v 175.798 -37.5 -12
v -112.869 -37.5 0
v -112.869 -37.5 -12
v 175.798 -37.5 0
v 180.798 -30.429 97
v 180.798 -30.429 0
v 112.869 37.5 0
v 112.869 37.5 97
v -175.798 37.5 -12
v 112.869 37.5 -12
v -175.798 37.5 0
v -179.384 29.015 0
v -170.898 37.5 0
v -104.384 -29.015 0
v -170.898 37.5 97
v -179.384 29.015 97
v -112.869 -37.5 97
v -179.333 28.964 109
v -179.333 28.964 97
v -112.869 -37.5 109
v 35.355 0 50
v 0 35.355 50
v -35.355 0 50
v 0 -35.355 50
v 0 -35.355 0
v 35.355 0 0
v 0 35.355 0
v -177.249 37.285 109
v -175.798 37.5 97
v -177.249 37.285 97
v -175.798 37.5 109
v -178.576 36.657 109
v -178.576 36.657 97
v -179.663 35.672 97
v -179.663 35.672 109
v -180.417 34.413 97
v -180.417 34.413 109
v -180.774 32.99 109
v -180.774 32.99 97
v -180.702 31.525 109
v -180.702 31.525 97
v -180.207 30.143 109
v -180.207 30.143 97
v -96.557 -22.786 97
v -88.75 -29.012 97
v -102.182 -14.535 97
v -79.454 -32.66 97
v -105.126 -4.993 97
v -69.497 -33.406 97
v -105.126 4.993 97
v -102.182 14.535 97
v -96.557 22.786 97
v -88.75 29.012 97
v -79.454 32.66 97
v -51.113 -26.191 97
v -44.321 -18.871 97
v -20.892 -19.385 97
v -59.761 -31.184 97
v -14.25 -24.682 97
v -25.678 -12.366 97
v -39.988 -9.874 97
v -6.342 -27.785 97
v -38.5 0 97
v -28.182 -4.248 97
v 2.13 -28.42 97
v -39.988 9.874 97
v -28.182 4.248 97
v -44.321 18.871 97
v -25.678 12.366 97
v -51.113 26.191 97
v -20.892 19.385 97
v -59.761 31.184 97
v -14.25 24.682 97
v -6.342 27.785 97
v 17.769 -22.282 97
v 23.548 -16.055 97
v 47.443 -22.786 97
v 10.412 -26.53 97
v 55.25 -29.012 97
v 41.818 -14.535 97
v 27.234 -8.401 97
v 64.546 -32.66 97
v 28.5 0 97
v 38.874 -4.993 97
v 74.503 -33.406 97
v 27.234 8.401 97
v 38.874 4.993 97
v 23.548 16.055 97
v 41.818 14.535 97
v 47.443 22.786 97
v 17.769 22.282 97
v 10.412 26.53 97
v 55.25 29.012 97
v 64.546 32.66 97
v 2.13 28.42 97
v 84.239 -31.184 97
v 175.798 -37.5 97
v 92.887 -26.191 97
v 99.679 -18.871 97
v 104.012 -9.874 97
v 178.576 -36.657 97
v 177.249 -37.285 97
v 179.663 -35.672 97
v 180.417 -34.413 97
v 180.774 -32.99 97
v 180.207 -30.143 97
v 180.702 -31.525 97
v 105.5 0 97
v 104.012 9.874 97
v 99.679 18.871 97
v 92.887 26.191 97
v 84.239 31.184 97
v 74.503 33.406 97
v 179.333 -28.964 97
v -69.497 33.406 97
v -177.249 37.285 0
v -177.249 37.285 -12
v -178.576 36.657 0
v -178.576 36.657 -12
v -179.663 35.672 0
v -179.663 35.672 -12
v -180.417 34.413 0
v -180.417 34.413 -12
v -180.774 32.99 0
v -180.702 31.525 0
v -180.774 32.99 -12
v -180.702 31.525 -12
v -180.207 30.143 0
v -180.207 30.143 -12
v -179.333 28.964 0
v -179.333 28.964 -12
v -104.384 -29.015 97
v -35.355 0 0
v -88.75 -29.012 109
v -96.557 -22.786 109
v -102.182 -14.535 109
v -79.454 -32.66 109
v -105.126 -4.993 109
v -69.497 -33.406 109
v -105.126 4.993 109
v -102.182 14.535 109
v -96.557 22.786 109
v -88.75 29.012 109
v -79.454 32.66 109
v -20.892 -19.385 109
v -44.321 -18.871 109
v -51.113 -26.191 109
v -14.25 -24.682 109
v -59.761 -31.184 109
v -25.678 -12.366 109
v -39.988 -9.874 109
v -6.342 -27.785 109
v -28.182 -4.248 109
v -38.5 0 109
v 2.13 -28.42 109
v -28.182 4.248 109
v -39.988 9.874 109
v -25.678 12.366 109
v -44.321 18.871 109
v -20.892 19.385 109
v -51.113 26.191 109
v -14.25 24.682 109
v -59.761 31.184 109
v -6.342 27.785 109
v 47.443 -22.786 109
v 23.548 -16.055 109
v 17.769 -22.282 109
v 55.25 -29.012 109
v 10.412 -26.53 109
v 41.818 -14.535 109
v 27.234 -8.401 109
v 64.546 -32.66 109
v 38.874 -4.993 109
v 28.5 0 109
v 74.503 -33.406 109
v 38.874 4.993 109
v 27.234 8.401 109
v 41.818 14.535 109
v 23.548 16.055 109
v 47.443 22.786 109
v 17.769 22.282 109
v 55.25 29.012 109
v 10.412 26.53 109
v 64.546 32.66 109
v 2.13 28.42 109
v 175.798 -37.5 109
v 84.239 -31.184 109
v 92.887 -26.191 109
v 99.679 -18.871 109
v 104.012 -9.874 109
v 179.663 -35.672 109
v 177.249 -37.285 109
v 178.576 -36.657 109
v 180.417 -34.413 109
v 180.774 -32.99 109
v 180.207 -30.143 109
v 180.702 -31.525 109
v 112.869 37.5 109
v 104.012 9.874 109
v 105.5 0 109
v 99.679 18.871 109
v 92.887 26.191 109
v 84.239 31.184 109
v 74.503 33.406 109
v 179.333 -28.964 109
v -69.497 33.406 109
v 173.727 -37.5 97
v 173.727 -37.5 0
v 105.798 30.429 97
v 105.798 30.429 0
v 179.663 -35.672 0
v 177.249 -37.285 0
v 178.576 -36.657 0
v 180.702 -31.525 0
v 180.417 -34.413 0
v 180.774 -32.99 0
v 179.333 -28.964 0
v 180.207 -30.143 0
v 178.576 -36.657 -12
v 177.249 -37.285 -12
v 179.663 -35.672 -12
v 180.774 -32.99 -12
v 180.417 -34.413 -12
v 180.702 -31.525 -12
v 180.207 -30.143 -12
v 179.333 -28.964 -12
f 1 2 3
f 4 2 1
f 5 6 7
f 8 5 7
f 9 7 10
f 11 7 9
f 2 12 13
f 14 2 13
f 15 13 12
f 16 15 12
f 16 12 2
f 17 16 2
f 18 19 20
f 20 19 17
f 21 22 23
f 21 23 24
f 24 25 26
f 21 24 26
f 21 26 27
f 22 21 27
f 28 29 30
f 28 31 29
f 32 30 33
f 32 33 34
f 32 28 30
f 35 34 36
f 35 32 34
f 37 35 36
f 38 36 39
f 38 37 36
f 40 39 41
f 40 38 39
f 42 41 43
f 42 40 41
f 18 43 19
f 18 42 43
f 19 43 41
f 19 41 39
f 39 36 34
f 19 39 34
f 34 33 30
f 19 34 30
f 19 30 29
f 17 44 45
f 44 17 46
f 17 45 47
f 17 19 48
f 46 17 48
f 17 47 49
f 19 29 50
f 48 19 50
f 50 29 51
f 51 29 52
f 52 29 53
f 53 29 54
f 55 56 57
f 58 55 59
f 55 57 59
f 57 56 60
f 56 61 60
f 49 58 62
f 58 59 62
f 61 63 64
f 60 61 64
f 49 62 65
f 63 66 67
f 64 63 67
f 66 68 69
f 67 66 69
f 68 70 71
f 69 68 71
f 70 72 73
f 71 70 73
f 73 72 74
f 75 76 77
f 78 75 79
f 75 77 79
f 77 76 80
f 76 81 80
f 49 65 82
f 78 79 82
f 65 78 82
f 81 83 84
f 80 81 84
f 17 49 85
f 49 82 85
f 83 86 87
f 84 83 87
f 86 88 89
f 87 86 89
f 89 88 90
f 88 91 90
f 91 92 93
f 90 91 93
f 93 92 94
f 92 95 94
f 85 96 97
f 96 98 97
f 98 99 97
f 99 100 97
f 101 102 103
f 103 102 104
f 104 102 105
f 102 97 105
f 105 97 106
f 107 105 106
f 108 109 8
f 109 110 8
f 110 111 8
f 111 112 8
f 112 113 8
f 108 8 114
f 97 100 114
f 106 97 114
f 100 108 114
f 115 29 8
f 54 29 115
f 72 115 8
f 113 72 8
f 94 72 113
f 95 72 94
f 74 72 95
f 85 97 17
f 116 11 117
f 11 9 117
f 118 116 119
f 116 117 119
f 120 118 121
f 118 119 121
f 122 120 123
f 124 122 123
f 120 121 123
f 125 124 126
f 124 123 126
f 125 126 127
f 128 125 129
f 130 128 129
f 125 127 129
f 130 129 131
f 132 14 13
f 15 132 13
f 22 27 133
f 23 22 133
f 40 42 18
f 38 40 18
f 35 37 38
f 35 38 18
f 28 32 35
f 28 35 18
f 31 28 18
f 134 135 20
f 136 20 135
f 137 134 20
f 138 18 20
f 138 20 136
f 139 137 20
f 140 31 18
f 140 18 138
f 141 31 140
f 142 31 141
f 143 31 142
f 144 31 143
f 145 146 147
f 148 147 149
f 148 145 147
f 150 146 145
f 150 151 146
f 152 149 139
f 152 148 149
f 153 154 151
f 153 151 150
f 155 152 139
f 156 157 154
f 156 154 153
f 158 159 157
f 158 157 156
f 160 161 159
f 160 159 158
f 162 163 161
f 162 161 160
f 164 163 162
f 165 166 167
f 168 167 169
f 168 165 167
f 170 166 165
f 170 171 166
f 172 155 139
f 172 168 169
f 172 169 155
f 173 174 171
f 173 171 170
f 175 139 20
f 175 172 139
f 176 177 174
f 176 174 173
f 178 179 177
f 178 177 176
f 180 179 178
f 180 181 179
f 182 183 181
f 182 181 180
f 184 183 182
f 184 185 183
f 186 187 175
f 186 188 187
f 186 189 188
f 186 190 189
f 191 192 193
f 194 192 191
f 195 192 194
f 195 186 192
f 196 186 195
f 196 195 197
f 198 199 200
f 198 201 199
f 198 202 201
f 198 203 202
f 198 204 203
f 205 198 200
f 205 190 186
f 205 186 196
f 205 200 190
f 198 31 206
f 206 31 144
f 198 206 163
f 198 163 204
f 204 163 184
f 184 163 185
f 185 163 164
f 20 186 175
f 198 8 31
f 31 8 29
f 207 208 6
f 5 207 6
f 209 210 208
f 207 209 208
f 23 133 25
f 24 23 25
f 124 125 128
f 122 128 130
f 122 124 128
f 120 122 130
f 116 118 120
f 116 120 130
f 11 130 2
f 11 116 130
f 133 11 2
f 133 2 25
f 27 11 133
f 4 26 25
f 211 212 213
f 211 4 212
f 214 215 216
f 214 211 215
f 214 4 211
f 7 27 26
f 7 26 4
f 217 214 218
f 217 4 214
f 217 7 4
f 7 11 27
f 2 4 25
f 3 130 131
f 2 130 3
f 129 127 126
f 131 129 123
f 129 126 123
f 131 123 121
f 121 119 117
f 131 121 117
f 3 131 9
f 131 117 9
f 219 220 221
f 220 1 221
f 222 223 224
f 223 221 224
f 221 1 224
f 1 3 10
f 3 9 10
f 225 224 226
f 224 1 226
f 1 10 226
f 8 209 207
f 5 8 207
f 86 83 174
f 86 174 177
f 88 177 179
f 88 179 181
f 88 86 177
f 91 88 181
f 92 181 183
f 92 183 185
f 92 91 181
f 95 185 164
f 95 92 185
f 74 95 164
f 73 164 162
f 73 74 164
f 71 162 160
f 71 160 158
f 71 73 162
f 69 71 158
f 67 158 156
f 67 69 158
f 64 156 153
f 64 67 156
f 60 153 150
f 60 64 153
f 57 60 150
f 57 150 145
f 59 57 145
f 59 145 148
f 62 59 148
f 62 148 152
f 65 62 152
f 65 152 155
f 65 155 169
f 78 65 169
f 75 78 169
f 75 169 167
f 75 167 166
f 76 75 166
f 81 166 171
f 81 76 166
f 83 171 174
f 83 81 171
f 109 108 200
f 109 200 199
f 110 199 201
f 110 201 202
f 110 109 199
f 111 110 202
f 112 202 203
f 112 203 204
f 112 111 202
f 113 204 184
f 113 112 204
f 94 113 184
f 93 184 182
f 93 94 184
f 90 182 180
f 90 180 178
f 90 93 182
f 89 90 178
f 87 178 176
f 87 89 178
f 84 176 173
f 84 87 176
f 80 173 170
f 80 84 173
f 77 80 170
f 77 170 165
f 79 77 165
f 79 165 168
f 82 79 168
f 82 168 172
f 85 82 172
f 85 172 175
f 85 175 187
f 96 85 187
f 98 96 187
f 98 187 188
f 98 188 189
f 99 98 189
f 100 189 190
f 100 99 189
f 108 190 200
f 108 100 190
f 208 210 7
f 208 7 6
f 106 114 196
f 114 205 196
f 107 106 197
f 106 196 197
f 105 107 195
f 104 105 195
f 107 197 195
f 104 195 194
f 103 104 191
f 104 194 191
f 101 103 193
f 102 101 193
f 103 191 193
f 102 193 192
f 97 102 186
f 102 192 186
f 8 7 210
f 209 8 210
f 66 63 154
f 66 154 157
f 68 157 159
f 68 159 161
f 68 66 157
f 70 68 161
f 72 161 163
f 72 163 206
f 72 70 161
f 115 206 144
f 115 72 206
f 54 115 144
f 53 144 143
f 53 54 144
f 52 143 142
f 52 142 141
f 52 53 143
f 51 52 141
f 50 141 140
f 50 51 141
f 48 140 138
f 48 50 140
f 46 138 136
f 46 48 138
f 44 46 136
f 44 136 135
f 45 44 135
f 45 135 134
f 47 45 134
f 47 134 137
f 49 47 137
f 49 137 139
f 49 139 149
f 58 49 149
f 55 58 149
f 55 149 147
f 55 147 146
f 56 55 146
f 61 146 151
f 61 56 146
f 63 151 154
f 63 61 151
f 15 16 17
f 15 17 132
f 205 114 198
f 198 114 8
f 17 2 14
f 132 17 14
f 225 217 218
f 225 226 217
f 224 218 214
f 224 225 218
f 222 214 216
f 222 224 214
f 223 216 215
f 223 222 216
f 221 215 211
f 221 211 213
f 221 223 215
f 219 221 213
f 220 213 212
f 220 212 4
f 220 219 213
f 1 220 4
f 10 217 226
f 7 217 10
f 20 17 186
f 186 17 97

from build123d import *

# Parameters (mm, degrees)
F3_DEPTH = 12
F4_R     = 33.5
F4_R_2   = 28.5
F5_DEPTH = 12
F6_DEPTH = 97
F8_DEPTH = 50
F9_R     = 5
F9_2_R   = 5


with BuildPart() as f3:
    # F2 (on Top) → F3 (new body)
    with BuildSketch(Plane.XY):
        Polygon((187.868919, -37.5), (112.868919, 37.5), (-187.868919, 37.5), (-112.868919, -37.5), align=None)
    extrude(amount=-F3_DEPTH)

    # F7 (on face) → F8 (join)
    with BuildSketch(Plane.XY):
        Polygon((0, -35.355339), (35.355339, 0), (0, 35.355339), (-35.355339, 0), align=None)
    extrude(amount=F8_DEPTH)

    # F9#2
    f9_2_edges = [f3.edges().sort_by_distance(p)[0] for p in [
        (-187.868919, 37.5, -6),
        (187.868919, -37.5, -6),
    ]]
    fillet(f9_2_edges, radius=F9_2_R)


with BuildPart() as f5:
    # F4 (on offset) → F5 (new body)
    with BuildSketch(Plane.XY.offset(97)):
        Polygon((187.868919, -37.5), (112.868919, 37.5), (-187.868919, 37.5), (-112.868919, -37.5), align=None)
        with Locations((-72, 0)):
            Circle(F4_R, mode=Mode.SUBTRACT)
        Circle(F4_R_2, mode=Mode.SUBTRACT)
        with Locations((72, 0)):
            Circle(F4_R, mode=Mode.SUBTRACT)
    extrude(amount=F5_DEPTH)

    # F9
    f9_edges = [f5.edges().sort_by_distance(p)[0] for p in [
        (-187.868919, 37.5, 103),
        (187.868919, -37.5, 103),
    ]]
    fillet(f9_edges, radius=F9_R)


with BuildPart() as f6:
    # F0 (on Top) → F6 (new body, through all)
    with BuildSketch(Plane.XY):
        Polygon((-179.383638, 29.014719), (-112.868919, -37.5), (-104.383638, -29.014719), (-170.898356, 37.5), align=None)
        Polygon((105.797851, 30.428932), (173.726783, -37.5), (180.797851, -30.428932), (112.868919, 37.5), align=None)
    extrude(amount=F6_DEPTH)


solid = Compound([f3.part, f5.part, f6.part])
